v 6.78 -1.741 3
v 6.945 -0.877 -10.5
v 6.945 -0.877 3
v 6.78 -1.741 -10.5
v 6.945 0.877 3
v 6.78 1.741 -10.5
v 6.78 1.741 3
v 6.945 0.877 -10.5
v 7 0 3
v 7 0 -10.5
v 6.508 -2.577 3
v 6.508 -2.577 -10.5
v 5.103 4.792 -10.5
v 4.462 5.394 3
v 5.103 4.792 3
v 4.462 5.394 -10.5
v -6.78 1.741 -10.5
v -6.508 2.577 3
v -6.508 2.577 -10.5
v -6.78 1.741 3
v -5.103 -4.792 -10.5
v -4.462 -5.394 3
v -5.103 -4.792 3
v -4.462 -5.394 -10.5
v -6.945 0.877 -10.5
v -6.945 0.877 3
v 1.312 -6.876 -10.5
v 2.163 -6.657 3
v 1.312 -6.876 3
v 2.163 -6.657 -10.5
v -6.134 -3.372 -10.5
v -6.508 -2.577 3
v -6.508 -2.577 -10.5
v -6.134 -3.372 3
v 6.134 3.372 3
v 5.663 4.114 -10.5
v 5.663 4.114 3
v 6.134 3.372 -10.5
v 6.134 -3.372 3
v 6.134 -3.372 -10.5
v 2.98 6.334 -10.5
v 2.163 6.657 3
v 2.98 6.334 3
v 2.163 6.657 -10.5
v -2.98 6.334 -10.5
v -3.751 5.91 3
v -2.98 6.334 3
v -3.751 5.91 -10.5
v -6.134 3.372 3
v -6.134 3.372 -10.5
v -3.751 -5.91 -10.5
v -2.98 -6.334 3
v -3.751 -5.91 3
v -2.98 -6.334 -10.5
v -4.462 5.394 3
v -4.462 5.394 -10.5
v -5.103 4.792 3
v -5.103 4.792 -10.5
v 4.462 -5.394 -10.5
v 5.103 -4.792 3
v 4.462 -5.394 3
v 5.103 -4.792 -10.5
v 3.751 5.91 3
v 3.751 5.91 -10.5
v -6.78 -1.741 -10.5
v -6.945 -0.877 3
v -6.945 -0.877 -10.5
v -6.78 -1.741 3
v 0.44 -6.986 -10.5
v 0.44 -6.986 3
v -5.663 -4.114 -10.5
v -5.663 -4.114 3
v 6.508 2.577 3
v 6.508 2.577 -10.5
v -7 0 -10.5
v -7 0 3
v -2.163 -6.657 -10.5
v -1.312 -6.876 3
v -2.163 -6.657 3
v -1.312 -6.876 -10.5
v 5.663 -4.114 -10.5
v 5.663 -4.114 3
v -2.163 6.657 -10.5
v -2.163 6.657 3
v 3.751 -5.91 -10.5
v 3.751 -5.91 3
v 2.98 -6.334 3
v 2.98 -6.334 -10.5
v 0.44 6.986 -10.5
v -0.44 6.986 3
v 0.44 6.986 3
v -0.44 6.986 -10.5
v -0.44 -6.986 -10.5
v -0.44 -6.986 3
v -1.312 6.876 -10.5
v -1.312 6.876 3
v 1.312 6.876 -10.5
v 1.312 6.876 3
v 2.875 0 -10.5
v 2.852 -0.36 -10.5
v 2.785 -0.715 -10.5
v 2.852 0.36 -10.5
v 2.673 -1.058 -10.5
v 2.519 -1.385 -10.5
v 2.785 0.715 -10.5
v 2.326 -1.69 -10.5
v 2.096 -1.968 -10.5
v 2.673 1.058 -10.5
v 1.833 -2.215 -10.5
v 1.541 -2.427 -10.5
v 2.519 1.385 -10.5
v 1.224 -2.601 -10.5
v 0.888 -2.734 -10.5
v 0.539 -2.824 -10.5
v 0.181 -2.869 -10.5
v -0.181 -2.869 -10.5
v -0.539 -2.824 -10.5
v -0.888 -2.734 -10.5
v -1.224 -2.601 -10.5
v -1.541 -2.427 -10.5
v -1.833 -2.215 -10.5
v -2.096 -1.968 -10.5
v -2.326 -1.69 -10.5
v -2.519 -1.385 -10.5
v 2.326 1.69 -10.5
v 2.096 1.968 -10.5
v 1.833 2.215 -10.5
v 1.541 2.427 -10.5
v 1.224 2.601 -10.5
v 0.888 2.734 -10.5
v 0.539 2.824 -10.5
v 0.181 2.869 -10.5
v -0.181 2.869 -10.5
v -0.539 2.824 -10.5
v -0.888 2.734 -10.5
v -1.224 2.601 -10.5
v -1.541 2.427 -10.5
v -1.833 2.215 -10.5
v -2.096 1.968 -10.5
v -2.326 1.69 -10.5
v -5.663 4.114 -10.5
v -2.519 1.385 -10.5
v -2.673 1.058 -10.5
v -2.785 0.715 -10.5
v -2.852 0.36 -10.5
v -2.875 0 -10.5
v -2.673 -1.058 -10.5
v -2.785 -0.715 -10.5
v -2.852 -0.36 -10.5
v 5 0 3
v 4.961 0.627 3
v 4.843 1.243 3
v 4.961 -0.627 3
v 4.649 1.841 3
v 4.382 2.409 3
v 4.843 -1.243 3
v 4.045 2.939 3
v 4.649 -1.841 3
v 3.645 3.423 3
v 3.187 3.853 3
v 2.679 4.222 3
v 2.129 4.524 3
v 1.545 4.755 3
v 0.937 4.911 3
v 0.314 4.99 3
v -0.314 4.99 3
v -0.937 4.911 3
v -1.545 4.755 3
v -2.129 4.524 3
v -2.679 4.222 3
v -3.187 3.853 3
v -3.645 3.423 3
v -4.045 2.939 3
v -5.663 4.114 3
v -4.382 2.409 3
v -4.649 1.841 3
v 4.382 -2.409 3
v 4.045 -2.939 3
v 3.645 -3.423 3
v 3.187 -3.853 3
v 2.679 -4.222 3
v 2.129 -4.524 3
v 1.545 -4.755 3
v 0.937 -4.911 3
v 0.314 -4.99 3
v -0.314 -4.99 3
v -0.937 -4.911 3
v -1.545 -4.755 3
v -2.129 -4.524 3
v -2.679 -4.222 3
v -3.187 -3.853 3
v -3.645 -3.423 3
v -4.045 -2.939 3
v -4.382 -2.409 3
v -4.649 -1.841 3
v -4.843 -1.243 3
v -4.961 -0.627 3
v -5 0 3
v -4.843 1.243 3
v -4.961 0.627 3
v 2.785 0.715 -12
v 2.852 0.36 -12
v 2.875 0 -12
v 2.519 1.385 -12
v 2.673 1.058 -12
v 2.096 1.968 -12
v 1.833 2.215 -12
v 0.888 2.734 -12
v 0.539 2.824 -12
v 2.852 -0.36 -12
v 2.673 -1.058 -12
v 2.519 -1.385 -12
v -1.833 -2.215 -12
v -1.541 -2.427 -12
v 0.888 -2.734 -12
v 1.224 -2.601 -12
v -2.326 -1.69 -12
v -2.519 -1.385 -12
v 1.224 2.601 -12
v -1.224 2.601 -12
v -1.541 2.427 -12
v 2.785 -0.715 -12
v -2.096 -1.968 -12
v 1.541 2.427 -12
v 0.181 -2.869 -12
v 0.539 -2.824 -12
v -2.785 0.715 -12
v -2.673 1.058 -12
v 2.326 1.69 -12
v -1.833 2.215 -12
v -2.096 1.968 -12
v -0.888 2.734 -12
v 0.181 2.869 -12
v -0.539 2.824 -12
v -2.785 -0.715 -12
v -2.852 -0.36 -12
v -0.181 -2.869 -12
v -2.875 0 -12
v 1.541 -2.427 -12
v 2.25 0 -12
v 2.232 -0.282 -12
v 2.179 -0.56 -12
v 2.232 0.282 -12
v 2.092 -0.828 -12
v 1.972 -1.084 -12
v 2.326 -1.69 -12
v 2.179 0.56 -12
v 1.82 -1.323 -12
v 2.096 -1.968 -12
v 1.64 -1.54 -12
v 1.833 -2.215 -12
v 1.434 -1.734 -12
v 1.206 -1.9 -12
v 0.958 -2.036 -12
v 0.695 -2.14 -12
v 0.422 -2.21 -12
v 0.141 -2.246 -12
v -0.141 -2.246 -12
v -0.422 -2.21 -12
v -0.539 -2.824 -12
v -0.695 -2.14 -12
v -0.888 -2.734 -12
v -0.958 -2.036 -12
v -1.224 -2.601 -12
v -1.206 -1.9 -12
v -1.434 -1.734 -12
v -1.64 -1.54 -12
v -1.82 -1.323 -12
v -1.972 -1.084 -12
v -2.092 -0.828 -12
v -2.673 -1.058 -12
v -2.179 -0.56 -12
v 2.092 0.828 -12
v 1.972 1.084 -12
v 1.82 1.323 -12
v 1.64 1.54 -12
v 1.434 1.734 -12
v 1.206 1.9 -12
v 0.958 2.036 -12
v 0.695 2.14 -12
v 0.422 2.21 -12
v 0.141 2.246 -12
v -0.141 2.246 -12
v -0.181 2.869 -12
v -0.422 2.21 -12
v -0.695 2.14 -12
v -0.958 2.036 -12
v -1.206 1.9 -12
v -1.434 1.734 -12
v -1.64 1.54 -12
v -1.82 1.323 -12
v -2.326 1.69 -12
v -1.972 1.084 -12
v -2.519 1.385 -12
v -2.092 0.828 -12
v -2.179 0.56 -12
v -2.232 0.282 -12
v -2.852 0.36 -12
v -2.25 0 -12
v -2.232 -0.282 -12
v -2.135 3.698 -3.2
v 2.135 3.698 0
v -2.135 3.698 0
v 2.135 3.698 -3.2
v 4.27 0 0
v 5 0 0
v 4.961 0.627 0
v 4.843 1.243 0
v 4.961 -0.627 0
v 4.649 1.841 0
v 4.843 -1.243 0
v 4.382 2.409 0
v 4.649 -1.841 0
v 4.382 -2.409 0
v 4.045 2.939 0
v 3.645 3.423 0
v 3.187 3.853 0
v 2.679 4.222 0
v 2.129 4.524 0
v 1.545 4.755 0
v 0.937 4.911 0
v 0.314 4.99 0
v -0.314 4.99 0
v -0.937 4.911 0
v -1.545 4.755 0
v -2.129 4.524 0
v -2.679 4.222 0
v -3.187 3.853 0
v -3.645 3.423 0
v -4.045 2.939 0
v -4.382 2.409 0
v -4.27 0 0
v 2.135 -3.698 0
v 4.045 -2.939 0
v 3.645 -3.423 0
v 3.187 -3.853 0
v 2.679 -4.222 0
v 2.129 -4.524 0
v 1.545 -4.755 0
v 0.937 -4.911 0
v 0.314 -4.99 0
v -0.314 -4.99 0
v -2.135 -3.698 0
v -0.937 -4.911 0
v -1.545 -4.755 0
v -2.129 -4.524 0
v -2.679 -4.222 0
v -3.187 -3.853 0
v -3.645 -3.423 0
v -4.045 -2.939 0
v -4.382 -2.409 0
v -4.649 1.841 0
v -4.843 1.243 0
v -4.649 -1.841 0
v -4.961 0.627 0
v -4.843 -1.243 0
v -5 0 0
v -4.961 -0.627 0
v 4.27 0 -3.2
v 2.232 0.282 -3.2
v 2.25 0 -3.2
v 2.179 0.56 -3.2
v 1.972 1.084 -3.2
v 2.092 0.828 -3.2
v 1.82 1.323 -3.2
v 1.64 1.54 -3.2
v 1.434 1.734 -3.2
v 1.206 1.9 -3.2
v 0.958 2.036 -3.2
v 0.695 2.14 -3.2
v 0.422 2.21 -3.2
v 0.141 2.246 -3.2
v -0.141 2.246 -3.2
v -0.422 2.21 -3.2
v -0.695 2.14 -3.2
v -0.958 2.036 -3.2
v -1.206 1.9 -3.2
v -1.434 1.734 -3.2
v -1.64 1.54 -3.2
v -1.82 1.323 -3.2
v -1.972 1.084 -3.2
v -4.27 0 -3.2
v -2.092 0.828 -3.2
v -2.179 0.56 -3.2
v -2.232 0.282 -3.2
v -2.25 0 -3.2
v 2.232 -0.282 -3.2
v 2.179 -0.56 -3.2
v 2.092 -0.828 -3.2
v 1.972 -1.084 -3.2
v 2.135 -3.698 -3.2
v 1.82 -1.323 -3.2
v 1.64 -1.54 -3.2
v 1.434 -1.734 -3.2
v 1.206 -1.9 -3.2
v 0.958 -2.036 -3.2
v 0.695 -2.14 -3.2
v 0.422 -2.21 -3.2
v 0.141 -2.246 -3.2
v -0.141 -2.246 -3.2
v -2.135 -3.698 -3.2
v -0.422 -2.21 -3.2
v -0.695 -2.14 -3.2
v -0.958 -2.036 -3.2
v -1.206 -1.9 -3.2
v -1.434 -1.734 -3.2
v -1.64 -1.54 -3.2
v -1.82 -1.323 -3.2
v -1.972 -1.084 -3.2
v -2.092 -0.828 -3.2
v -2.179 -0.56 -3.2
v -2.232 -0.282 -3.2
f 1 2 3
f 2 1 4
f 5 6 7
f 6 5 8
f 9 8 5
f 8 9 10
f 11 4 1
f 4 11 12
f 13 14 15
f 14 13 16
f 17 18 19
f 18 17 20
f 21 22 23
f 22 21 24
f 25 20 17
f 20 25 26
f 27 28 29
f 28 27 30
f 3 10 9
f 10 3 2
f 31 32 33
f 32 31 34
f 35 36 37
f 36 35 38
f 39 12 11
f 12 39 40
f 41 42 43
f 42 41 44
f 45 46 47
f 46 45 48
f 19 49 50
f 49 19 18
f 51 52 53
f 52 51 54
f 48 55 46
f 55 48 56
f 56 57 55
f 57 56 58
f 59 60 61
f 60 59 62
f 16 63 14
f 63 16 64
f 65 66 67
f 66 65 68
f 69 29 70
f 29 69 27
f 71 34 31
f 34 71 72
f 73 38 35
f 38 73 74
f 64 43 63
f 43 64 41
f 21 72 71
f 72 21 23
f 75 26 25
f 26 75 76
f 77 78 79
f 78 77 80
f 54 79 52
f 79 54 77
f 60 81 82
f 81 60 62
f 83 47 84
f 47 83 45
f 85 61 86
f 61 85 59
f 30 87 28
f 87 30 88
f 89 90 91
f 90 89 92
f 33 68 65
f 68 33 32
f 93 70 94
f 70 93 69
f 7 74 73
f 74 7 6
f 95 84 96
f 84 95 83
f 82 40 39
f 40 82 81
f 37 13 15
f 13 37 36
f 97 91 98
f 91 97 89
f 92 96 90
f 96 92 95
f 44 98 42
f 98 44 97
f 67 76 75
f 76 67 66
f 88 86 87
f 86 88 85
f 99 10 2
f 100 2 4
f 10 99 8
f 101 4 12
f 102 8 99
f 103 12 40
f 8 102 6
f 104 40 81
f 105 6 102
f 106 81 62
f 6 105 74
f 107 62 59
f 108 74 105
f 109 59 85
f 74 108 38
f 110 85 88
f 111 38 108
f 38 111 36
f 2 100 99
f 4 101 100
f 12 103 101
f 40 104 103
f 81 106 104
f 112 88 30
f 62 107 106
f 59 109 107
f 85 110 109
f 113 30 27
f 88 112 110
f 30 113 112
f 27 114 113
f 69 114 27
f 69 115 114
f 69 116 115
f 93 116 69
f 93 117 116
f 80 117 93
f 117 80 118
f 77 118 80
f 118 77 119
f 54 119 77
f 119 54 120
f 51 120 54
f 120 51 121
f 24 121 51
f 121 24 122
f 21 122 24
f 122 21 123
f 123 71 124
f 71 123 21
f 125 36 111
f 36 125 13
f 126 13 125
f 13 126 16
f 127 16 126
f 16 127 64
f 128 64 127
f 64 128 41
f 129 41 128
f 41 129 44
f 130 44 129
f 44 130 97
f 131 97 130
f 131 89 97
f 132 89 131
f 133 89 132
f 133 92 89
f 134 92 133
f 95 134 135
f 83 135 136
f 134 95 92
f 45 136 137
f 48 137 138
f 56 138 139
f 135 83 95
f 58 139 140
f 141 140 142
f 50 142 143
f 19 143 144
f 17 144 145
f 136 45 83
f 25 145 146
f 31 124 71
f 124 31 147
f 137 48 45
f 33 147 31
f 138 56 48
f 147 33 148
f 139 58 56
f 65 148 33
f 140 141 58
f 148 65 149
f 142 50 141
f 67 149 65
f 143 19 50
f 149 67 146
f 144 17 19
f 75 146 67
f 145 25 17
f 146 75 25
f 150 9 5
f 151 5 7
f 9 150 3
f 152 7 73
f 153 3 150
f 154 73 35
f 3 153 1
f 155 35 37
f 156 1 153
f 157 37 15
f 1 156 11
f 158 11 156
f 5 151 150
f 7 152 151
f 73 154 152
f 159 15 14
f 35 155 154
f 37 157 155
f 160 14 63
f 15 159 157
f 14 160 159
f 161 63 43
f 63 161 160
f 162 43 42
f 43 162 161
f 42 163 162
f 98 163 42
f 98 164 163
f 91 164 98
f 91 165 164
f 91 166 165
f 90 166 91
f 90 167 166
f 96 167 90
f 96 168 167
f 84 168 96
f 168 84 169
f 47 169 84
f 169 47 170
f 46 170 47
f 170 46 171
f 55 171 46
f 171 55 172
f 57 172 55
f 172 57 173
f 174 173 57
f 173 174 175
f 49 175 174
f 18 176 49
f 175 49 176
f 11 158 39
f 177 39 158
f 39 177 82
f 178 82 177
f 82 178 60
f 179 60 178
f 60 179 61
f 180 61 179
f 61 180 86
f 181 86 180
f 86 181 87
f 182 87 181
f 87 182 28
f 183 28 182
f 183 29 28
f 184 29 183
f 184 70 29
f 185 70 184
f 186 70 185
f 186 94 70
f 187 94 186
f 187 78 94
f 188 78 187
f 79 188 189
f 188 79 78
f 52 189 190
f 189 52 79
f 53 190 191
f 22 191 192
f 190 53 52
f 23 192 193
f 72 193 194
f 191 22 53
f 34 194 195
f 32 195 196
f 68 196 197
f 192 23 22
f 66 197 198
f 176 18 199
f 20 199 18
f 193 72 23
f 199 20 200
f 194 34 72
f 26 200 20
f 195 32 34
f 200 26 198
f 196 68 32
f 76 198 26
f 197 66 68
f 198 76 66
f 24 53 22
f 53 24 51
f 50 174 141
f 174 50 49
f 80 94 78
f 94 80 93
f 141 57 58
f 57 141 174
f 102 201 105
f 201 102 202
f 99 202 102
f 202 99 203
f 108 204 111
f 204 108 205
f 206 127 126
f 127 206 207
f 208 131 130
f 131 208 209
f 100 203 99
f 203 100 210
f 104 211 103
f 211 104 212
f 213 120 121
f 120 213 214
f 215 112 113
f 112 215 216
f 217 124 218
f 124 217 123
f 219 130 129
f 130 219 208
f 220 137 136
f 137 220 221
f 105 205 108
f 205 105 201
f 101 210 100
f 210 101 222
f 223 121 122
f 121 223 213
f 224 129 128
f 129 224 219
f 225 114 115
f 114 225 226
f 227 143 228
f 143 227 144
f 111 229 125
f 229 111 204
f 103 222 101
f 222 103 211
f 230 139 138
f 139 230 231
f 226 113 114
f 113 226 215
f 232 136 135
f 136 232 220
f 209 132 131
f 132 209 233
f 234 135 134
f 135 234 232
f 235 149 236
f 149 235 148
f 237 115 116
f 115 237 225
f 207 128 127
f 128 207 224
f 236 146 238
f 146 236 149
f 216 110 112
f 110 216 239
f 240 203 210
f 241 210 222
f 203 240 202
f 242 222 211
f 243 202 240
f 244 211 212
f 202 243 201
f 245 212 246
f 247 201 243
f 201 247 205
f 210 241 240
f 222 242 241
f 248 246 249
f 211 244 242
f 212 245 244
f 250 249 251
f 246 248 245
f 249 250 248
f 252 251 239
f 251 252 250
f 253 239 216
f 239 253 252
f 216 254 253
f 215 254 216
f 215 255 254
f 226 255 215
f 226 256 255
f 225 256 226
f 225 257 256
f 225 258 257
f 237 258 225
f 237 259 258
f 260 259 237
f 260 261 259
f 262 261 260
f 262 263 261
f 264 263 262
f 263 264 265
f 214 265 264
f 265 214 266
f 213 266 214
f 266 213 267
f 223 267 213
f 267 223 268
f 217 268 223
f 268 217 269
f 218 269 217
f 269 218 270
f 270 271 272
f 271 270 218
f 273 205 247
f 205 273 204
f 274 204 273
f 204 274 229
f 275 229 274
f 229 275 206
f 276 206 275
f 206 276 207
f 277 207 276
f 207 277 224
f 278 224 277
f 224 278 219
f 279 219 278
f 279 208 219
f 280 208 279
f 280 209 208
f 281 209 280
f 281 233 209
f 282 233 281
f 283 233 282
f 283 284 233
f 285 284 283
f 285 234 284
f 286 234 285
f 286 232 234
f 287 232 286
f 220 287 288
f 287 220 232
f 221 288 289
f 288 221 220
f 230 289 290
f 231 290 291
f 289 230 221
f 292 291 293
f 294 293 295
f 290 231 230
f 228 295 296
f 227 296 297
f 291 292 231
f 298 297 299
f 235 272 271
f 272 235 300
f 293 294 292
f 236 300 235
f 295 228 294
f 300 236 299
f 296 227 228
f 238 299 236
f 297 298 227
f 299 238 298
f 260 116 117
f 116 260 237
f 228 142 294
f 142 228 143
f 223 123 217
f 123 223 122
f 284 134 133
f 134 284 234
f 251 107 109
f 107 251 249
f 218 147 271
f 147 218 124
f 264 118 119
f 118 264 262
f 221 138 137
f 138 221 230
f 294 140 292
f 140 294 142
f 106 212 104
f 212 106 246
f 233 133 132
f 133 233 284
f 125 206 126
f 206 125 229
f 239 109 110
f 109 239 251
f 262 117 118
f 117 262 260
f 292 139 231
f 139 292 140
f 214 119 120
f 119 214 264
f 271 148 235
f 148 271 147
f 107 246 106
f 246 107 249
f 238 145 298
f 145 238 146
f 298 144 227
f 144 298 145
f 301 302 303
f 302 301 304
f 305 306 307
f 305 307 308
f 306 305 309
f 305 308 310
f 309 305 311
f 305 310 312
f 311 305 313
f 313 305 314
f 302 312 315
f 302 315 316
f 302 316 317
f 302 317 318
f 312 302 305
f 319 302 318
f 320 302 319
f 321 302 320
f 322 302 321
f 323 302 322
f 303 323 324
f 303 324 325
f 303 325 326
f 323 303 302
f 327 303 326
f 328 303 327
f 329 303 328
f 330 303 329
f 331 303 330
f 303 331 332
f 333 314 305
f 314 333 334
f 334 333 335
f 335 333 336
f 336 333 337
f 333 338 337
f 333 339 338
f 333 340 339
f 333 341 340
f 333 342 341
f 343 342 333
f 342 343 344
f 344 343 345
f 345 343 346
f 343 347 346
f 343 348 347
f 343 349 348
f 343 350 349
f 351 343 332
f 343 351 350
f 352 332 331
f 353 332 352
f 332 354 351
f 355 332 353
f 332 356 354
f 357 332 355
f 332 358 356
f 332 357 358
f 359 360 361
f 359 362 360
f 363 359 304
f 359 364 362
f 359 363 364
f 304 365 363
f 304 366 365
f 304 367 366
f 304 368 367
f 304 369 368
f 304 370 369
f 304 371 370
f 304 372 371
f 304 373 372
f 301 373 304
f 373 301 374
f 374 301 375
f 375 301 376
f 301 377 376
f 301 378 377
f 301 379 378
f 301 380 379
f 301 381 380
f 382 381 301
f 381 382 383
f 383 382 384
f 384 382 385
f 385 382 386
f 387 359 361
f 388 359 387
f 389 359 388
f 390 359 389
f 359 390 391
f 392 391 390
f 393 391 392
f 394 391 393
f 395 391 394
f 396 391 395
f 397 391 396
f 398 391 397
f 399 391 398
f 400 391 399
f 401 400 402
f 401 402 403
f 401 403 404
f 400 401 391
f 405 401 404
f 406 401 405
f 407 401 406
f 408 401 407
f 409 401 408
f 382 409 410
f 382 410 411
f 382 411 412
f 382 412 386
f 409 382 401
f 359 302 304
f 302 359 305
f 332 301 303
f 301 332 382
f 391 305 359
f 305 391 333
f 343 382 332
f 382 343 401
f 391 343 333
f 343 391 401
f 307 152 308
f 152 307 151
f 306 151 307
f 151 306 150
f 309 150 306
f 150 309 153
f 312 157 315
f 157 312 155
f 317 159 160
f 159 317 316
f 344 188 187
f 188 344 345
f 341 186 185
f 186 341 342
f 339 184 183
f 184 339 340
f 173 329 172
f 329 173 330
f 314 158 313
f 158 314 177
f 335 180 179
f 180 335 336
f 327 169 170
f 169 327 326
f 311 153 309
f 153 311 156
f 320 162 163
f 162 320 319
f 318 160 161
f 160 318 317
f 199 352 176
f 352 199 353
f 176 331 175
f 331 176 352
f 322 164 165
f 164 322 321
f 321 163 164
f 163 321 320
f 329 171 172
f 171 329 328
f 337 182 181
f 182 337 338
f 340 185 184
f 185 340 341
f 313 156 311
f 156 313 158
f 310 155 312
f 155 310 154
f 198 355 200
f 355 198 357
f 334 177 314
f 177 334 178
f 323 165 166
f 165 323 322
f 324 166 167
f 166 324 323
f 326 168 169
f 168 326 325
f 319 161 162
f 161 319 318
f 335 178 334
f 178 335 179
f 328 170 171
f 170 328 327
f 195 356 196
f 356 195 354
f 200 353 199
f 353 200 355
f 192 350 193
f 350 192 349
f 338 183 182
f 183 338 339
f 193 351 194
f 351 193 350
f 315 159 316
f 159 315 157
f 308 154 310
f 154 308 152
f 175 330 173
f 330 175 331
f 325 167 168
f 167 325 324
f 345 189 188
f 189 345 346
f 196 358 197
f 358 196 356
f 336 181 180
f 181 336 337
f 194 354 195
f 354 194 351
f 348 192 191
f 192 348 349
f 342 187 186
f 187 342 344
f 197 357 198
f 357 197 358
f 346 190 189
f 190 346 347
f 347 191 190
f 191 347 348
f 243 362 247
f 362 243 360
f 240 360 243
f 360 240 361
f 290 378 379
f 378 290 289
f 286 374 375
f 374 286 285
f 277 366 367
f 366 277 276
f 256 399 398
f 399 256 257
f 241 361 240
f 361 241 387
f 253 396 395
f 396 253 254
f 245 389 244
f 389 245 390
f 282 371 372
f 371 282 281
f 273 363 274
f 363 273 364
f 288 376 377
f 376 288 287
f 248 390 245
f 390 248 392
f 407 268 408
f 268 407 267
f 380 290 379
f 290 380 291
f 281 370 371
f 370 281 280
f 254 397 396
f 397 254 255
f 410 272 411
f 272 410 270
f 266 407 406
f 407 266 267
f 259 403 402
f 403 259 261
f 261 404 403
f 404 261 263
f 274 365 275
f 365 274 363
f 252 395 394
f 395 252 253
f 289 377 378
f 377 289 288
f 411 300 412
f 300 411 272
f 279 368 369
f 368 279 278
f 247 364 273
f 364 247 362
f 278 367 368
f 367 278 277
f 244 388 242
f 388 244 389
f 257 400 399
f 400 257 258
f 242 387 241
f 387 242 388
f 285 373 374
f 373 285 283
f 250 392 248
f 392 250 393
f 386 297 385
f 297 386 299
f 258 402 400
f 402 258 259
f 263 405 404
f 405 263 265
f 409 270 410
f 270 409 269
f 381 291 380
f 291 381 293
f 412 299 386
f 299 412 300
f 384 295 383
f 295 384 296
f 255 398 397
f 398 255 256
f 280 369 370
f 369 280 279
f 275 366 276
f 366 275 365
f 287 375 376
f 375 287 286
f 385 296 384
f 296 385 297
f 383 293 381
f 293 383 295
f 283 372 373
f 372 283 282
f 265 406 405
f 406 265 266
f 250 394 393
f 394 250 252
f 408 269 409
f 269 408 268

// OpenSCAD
$fn = 50;

difference() {
	union() {
		translate(v = [0, 0, -10.5]) {
			cylinder(h = 13.5, r = 7.0);
		}
		#translate(v = [0, 0, -12.0]) {
			cylinder(h = 12, r = 2.875);
		}
	}
	union() {
		translate(v = [0, 0, 0]) {
			rotate(a = [0, 0, 0]) {
				difference() {
					union() {
						translate(v = [0, 0, -3.2]) {
							linear_extrude(height = 3.2) {
								polygon(points = [[4.2698, 0.0], [2.1349000000000005, 3.697755269078796], [-2.134899999999999, 3.6977552690787965], [-4.2698, 5.228996902999369e-16], [-2.134900000000002, -3.6977552690787956], [2.1348999999999974, -3.697755269078798]]);
							}
						}
					}
					union();
				}
			}
		}
		#cylinder(h = 3, r = 5.0);
		#translate(v = [0, 0, -100.0]) {
			cylinder(h = 200, r = 2.25);
		}
	}
}
